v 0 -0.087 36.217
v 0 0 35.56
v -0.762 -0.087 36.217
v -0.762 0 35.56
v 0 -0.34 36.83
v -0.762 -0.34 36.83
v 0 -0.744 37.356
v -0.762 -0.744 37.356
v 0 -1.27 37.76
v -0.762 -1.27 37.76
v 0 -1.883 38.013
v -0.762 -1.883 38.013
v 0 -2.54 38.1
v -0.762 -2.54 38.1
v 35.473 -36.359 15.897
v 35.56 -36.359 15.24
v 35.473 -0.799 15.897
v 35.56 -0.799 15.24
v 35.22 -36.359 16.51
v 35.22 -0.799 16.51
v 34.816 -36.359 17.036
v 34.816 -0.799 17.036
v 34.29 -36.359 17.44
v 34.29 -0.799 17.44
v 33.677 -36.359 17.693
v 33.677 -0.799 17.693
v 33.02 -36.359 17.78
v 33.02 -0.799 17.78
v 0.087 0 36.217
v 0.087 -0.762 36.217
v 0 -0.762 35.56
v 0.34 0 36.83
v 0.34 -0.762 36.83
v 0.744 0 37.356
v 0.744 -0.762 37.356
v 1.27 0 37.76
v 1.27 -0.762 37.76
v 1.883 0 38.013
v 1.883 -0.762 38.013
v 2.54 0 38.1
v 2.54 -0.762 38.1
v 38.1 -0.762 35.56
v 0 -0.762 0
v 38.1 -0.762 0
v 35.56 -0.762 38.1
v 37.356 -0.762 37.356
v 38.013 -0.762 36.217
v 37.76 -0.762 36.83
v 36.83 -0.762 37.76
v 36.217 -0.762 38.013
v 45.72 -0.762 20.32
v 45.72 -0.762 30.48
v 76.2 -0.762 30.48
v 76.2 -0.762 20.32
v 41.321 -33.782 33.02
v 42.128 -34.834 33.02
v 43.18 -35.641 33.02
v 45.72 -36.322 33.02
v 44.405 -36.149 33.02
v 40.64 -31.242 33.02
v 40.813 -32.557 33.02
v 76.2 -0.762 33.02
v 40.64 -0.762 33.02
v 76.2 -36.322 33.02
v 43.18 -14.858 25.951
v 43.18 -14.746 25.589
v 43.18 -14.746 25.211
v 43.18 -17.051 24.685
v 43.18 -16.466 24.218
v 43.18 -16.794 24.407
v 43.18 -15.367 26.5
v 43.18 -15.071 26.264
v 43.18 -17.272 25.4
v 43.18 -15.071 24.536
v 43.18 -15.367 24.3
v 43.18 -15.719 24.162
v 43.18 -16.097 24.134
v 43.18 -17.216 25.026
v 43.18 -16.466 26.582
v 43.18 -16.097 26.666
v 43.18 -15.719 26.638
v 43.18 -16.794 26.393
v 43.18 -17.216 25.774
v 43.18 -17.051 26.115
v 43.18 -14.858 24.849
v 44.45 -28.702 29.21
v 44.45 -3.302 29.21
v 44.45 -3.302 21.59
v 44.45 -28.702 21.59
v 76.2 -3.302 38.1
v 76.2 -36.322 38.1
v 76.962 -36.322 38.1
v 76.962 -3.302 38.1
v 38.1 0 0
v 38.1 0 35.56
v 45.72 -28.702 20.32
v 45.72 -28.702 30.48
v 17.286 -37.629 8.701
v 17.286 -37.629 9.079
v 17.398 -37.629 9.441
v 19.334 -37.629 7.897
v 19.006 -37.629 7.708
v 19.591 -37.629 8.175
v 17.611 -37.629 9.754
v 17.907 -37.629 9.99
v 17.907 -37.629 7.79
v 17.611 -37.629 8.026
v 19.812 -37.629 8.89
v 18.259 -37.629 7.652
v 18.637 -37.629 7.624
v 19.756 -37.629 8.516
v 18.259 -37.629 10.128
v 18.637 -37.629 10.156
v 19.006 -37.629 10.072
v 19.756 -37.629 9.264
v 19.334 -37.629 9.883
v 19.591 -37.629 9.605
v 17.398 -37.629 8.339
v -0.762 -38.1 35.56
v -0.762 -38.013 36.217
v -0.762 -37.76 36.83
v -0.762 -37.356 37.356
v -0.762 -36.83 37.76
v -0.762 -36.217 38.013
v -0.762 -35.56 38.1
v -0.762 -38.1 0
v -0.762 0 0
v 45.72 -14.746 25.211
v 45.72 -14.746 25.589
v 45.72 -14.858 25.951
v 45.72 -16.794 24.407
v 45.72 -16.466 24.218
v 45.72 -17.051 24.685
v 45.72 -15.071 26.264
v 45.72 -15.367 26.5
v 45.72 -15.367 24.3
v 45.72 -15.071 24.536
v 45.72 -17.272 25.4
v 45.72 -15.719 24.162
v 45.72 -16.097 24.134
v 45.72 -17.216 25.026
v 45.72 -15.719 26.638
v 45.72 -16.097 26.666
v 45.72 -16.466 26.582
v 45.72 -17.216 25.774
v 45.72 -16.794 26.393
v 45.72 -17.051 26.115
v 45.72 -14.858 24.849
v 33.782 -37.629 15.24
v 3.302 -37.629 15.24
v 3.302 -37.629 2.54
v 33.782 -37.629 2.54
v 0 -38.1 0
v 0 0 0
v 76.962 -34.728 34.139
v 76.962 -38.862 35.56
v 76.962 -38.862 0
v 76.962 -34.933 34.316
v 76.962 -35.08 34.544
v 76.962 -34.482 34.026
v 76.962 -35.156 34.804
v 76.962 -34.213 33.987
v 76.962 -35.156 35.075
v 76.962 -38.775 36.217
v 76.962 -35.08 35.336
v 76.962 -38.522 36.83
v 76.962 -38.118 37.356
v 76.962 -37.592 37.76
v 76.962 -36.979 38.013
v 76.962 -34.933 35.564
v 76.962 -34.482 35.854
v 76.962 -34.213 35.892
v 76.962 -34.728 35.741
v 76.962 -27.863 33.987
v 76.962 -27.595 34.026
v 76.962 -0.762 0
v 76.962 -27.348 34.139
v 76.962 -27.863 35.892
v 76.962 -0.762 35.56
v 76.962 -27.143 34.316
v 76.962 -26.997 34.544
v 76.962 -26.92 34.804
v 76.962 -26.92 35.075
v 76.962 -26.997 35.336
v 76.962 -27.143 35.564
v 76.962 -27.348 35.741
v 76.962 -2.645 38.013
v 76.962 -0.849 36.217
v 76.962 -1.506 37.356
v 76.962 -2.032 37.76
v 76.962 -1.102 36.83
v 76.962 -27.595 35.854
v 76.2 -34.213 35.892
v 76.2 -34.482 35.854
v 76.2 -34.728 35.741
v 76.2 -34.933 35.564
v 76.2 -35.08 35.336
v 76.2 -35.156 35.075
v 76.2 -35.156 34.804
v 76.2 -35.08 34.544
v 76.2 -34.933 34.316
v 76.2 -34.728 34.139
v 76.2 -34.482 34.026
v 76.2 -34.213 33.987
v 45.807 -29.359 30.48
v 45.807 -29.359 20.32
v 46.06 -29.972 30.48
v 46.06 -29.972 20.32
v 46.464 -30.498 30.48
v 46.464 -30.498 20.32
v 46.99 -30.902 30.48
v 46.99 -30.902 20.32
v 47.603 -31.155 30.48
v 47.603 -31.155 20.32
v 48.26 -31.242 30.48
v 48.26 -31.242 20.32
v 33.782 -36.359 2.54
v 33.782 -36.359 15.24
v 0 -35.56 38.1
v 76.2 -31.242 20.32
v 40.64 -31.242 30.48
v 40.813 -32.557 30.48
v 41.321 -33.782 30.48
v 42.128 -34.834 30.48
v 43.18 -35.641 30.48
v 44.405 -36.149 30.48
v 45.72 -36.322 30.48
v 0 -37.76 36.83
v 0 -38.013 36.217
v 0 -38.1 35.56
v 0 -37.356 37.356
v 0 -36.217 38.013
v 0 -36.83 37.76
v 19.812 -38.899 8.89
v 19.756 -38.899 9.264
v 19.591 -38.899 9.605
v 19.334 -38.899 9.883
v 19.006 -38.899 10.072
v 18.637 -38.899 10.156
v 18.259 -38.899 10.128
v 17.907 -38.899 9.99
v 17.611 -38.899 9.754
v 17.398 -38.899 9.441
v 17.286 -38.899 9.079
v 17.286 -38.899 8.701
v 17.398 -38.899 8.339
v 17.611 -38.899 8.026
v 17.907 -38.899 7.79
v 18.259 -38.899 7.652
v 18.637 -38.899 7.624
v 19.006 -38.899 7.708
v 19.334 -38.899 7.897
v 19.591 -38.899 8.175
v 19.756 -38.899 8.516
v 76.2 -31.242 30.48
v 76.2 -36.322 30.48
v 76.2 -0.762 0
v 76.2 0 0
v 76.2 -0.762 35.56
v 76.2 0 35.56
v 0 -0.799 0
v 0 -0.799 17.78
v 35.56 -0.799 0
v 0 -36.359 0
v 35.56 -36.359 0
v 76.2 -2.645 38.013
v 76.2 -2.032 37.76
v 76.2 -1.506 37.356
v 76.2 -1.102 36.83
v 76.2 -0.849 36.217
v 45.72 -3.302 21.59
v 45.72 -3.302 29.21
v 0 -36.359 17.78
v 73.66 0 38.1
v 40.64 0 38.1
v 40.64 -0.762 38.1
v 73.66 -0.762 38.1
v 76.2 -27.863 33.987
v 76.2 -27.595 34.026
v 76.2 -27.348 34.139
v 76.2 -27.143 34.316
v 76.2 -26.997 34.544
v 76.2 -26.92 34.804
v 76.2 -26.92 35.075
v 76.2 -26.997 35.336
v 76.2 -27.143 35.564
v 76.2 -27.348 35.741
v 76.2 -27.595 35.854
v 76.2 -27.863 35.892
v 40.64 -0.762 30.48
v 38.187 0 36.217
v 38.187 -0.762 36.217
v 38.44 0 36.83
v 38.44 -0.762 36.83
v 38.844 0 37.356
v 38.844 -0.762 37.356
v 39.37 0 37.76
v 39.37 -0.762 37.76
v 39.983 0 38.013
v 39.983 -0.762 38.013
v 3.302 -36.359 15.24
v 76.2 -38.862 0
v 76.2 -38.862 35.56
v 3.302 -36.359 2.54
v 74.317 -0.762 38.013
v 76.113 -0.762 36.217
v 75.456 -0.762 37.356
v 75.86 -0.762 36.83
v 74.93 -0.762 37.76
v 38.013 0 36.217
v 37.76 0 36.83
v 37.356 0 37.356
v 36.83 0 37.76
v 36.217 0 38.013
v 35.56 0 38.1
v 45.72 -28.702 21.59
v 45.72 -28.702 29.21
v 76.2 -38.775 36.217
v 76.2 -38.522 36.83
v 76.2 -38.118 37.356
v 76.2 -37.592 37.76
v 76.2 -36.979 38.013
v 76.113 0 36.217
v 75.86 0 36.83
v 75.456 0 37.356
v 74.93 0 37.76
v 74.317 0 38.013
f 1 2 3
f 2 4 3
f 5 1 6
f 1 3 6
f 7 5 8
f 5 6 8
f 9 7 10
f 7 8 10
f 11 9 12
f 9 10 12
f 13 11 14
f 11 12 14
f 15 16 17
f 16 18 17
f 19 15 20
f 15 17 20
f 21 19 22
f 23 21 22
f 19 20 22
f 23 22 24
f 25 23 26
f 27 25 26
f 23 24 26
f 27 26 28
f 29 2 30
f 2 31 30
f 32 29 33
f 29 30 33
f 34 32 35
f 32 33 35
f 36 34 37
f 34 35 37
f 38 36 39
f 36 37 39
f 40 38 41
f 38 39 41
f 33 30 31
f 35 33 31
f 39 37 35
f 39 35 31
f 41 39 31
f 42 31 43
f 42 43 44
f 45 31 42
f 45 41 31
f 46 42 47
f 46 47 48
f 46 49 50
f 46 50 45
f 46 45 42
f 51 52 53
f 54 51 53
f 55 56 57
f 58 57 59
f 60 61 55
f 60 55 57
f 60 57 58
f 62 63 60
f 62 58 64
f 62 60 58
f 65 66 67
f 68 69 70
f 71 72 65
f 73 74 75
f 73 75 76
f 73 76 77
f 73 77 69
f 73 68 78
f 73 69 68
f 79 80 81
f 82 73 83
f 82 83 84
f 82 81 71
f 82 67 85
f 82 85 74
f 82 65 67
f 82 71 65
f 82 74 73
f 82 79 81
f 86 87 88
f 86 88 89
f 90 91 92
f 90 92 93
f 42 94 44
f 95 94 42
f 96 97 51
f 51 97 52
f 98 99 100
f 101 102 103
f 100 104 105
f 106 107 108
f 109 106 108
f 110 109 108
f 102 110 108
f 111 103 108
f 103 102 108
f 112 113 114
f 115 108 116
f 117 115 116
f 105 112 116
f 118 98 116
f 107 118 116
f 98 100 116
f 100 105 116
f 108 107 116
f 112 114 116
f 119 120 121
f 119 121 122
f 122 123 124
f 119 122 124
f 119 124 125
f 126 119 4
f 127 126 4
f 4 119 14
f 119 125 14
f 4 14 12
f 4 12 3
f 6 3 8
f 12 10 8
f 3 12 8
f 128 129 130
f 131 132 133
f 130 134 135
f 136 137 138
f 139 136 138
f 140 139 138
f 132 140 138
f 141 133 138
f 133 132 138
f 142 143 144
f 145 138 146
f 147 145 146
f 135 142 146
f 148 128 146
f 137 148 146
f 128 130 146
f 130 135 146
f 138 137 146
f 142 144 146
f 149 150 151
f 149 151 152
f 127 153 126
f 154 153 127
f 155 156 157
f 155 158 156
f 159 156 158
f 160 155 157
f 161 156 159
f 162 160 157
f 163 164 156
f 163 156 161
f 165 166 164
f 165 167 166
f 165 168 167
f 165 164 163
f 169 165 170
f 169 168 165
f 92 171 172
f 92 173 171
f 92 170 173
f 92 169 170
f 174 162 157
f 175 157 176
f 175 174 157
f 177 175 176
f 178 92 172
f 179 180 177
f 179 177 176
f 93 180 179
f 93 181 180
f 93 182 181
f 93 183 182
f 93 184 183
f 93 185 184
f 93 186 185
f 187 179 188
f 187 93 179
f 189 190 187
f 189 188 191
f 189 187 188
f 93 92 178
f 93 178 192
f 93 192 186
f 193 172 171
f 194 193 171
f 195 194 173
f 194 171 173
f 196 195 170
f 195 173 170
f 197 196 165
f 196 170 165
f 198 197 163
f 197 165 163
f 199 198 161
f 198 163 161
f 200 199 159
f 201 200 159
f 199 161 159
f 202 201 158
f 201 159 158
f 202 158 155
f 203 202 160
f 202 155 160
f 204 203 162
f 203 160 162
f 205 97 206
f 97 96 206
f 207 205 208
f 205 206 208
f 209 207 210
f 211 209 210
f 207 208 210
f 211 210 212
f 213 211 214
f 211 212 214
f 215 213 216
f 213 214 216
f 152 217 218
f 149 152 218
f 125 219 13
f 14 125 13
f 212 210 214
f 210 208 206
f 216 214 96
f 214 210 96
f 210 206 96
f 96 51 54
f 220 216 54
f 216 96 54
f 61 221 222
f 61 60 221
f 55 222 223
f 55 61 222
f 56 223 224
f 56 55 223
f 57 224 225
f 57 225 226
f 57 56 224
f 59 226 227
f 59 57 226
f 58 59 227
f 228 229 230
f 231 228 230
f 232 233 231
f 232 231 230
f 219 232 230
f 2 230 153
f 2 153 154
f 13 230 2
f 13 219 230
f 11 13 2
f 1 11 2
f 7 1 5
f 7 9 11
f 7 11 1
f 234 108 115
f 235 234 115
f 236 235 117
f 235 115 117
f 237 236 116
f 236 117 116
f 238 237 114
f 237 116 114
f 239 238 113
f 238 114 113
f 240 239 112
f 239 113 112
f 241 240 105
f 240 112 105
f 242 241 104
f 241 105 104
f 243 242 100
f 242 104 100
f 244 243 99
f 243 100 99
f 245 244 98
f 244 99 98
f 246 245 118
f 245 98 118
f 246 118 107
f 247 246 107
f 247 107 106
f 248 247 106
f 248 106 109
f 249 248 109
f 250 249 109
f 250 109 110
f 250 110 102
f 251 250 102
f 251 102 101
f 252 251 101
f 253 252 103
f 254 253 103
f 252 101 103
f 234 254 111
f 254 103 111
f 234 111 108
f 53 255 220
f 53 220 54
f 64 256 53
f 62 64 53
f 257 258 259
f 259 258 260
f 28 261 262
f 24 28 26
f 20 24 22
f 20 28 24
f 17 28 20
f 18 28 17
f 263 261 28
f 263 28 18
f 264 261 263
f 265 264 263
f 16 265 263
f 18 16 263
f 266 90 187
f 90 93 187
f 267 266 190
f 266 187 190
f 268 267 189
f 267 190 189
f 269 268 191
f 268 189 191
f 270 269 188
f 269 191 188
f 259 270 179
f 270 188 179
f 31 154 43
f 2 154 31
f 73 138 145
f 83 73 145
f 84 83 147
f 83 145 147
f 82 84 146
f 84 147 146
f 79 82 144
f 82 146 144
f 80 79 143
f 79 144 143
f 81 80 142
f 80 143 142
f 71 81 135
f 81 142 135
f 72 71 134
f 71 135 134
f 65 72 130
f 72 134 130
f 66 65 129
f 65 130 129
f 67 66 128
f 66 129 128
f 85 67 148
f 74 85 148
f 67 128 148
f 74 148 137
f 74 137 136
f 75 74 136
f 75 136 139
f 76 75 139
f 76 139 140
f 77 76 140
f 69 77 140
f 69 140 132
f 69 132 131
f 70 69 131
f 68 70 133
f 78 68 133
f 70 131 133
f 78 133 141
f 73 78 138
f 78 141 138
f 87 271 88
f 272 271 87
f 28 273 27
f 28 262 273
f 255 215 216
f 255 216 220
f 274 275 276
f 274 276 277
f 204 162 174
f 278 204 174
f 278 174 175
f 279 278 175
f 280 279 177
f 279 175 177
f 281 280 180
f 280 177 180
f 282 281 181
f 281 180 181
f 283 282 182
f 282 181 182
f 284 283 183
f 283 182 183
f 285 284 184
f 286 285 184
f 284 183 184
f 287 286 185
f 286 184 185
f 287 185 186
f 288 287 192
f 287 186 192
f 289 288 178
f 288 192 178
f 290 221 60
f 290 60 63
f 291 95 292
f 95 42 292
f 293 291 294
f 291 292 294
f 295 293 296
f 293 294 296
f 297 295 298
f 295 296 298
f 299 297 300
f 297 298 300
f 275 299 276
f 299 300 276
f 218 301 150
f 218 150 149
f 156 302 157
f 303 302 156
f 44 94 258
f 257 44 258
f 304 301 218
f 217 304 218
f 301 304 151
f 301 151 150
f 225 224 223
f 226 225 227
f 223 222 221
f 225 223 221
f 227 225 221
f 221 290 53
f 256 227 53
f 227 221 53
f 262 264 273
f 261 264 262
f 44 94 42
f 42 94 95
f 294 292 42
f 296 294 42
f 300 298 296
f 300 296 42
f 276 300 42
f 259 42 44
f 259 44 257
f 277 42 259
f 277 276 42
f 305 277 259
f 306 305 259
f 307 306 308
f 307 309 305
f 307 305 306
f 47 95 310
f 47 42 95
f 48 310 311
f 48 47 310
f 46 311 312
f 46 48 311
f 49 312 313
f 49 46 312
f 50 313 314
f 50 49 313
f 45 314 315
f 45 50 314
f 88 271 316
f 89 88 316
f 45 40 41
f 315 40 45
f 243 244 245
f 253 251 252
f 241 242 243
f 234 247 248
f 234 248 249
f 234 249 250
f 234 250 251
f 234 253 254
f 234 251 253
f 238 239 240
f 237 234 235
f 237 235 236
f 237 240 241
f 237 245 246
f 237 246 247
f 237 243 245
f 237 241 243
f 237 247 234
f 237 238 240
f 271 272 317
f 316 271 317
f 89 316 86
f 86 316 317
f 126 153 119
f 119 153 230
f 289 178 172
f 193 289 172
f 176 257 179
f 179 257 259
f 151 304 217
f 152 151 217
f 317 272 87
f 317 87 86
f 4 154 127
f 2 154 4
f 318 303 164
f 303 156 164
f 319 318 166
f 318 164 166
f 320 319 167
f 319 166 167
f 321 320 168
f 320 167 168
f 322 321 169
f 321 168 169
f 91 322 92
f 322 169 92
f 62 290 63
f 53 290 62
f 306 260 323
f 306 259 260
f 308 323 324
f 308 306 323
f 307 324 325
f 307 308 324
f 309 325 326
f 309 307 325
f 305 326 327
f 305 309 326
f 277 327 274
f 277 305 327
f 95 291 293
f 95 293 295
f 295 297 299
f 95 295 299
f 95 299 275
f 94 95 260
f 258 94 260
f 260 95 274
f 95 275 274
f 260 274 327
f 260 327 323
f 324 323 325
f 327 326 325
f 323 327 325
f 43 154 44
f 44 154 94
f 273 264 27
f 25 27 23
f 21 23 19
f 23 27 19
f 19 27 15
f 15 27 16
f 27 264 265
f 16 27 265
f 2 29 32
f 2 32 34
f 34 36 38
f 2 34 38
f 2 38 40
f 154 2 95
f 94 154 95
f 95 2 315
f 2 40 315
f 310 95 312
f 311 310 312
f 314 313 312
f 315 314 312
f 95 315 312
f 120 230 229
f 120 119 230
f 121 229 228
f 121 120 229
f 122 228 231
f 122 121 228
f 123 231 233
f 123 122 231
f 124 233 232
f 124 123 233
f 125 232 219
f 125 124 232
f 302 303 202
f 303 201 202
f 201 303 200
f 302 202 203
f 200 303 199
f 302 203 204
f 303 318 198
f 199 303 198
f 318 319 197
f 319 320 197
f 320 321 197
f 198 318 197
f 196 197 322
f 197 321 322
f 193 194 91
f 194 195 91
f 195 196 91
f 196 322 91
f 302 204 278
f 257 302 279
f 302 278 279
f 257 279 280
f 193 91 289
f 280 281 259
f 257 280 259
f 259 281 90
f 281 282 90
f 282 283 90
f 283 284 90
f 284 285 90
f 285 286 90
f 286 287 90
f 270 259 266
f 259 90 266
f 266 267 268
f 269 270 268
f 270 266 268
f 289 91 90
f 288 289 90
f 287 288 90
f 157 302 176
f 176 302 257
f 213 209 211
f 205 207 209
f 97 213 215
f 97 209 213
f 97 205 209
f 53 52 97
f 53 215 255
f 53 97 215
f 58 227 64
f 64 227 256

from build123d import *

# Parameters (mm, degrees)
F0_W      = 38.1
F0_H      = 38.1
F2_DEPTH  = 0.762
F1_W      = 38.1
F1_H      = 38.1
F3_DEPTH  = 0.762
F4_W      = 35.56
F4_H      = 35.56
F5_DEPTH  = 17.78
F8_W      = 30.48
F8_H      = 30.48
F9_DEPTH  = 10.16
F7_W      = 35.56
F7_H      = 35.56
F10_DEPTH = 2.54
F11_W     = 30.48
F11_H     = 12.7
F12_DEPTH = 1.27
F13_R     = 1.27
F14_DEPTH = 1.27
F16_R     = 1.27
F17_DEPTH = 2.54
F15_W     = 25.4
F15_H     = 7.62
F18_DEPTH = 1.27
F19_R     = 2.54
F19_2_R   = 2.54
F19_3_R   = 2.54
F19_4_R   = 2.54
F20_R     = 5.08
F23_DEPTH = 12.7
F24_DEPTH = 0.762
F26_W     = 38.1
F26_H     = 38.1
F27_DEPTH = 0.762
F29_DEPTH = 12.7
F30_R     = 2.54
F30_2_R   = 2.54


# Not quite as in the source:
# - two fillets or chamfers of one size are made in one step
# - a feature names something its author has since deleted; it is built from what else it names


with BuildPart() as f2:
    # F0 (on Right) → F2 (new body)
    with BuildSketch(Plane.YZ):
        with Locations((-19.05, 19.05)):
            Rectangle(F0_W, F0_H)
    extrude(amount=-F2_DEPTH)

    # F19
    f19_edges = [f2.edges().sort_by_distance(p)[0] for p in [
        (-0.381, -38.1, 38.1),
        (-0.381, 0, 38.1),
    ]]
    fillet(f19_edges, radius=F19_R)

    # F22 (on face) → F23 (cut)
    with BuildSketch(Plane.YZ):
        with BuildLine():
            ThreePointArc((35.283215344, 34.4806989491), (34.330715344, 35.4331989491), (33.378215344, 34.4806989491))
            Line((33.378215344, 34.4806989491), (33.378215344, 28.1306989491))
            ThreePointArc((33.378215344, 28.1306989491), (34.330715344, 27.1781989491), (35.283215344, 28.1306989491))
            Line((35.283215344, 28.1306989491), (35.283215344, 34.4806989491))
        make_face()
    extrude(amount=-F23_DEPTH, mode=Mode.SUBTRACT)


with BuildPart() as f3:
    # F1 (on Front) → F3 (new body)
    with BuildSketch(Plane.XZ):
        with Locations((19.05, 19.05)):
            Rectangle(F1_W, F1_H)
    extrude(amount=F3_DEPTH)

    # F19#2
    f19_2_edges = [f3.edges().sort_by_distance(p)[0] for p in [
        (0, -0.381, 38.1),
        (38.1, -0.381, 38.1),
    ]]
    fillet(f19_2_edges, radius=F19_2_R)


with BuildPart() as f5:
    # F4 (on Top) → F5 (new body)
    with BuildSketch(Plane.XY):
        with Locations((17.78, -18.5785688174)):
            Rectangle(F4_W, F4_H)
    extrude(amount=F5_DEPTH)

    # F19#3
    f19_3_edges = [f5.edges().sort_by_distance(p)[0] for p in [
        (35.56, -18.578569, 17.78),
    ]]
    fillet(f19_3_edges, radius=F19_3_R)


with BuildPart() as f9:
    # F8 (on offset) → F9 (new body)
    with BuildSketch(Plane.XY.offset(30.48)):
        with Locations((60.96, -16.002)):
            Rectangle(F8_W, F8_H)
    extrude(amount=-F9_DEPTH)

    # F19#4
    f19_4_edges = [f9.edges().sort_by_distance(p)[0] for p in [
        (45.72, -31.242, 25.4),
    ]]
    fillet(f19_4_edges, radius=F19_4_R)


with BuildPart() as f10:
    # F7 (on offset) → F10 (new body)
    with BuildSketch(Plane.XY.offset(30.48)):
        with Locations((58.42, -18.542)):
            Rectangle(F7_W, F7_H)
    extrude(amount=F10_DEPTH)

    # F20
    f20_edges = [f10.edges().sort_by_distance(p)[0] for p in [
        (40.64, -36.322, 31.75),
    ]]
    fillet(f20_edges, radius=F20_R)


with BuildPart() as f12:
    # F11 (on face) → F12 (new body)
    with BuildSketch(Plane.XZ.offset(36.3585688174)):
        with Locations((18.542, 8.89)):
            Rectangle(F11_W, F11_H)
    extrude(amount=F12_DEPTH)


with BuildPart() as f14:
    # F13 (on face) → F14 (new body)
    with BuildSketch(Plane.XZ.offset(37.6285688174)):
        with Locations((18.542, 8.89)):
            Circle(F13_R)
    extrude(amount=F14_DEPTH)


with BuildPart() as f17:
    # F16 (on face) → F17 (new body)
    with BuildSketch(Plane(origin=(45.72, 0, 0), x_dir=(0, -1, 0), z_dir=(-1, 0, 0))):
        with Locations((16.002, 25.4)):
            Circle(F16_R)
    extrude(amount=F17_DEPTH)


with BuildPart() as f18:
    # F15 (on face) → F18 (new body)
    with BuildSketch(Plane(origin=(45.72, 0, 0), x_dir=(0, -1, 0), z_dir=(-1, 0, 0))):
        with Locations((16.002, 25.4)):
            Rectangle(F15_W, F15_H)
    extrude(amount=F18_DEPTH)


with BuildPart() as f24:
    # F1 (on Front) → F24 (new body)
    with BuildSketch(Plane.XZ):
        with Locations((57.15, 19.05)):
            Rectangle(F1_W, F1_H)
    extrude(amount=F24_DEPTH)

    # F30
    f30_edges = [f24.edges().sort_by_distance(p)[0] for p in [
        (76.2, -0.381, 38.1),
        (38.1, -0.381, 38.1),
    ]]
    fillet(f30_edges, radius=F30_R)


with BuildPart() as f27:
    # F26 (on offset) → F27 (new body)
    with BuildSketch(Plane.YZ.offset(76.2)):
        with Locations((-19.812, 19.05)):
            Rectangle(F26_W, F26_H)
    extrude(amount=F27_DEPTH)

    # F28 (on face) → F29 (cut)
    with BuildSketch(Plane.YZ.offset(76.962)):
        with BuildLine():
            Line((-27.8631728142, 35.8923991907), (-34.2131728142, 35.8923991907))
            ThreePointArc((-34.2131728142, 35.8923991907), (-35.1656728142, 34.9398991907), (-34.2131728142, 33.9873991907))
            Line((-34.2131728142, 33.9873991907), (-27.8631728142, 33.9873991907))
            ThreePointArc((-27.8631728142, 33.9873991907), (-26.9106728142, 34.9398991907), (-27.8631728142, 35.8923991907))
        make_face()
    extrude(amount=-F29_DEPTH, mode=Mode.SUBTRACT)

    # F30#2
    f30_2_edges = [f27.edges().sort_by_distance(p)[0] for p in [
        (76.581, -0.762, 38.1),
        (76.581, -38.862, 38.1),
    ]]
    fillet(f30_2_edges, radius=F30_2_R)


solid = Compound([f2.part, f3.part, f5.part, f9.part, f10.part, f12.part, f14.part, f17.part, f18.part, f24.part, f27.part])
